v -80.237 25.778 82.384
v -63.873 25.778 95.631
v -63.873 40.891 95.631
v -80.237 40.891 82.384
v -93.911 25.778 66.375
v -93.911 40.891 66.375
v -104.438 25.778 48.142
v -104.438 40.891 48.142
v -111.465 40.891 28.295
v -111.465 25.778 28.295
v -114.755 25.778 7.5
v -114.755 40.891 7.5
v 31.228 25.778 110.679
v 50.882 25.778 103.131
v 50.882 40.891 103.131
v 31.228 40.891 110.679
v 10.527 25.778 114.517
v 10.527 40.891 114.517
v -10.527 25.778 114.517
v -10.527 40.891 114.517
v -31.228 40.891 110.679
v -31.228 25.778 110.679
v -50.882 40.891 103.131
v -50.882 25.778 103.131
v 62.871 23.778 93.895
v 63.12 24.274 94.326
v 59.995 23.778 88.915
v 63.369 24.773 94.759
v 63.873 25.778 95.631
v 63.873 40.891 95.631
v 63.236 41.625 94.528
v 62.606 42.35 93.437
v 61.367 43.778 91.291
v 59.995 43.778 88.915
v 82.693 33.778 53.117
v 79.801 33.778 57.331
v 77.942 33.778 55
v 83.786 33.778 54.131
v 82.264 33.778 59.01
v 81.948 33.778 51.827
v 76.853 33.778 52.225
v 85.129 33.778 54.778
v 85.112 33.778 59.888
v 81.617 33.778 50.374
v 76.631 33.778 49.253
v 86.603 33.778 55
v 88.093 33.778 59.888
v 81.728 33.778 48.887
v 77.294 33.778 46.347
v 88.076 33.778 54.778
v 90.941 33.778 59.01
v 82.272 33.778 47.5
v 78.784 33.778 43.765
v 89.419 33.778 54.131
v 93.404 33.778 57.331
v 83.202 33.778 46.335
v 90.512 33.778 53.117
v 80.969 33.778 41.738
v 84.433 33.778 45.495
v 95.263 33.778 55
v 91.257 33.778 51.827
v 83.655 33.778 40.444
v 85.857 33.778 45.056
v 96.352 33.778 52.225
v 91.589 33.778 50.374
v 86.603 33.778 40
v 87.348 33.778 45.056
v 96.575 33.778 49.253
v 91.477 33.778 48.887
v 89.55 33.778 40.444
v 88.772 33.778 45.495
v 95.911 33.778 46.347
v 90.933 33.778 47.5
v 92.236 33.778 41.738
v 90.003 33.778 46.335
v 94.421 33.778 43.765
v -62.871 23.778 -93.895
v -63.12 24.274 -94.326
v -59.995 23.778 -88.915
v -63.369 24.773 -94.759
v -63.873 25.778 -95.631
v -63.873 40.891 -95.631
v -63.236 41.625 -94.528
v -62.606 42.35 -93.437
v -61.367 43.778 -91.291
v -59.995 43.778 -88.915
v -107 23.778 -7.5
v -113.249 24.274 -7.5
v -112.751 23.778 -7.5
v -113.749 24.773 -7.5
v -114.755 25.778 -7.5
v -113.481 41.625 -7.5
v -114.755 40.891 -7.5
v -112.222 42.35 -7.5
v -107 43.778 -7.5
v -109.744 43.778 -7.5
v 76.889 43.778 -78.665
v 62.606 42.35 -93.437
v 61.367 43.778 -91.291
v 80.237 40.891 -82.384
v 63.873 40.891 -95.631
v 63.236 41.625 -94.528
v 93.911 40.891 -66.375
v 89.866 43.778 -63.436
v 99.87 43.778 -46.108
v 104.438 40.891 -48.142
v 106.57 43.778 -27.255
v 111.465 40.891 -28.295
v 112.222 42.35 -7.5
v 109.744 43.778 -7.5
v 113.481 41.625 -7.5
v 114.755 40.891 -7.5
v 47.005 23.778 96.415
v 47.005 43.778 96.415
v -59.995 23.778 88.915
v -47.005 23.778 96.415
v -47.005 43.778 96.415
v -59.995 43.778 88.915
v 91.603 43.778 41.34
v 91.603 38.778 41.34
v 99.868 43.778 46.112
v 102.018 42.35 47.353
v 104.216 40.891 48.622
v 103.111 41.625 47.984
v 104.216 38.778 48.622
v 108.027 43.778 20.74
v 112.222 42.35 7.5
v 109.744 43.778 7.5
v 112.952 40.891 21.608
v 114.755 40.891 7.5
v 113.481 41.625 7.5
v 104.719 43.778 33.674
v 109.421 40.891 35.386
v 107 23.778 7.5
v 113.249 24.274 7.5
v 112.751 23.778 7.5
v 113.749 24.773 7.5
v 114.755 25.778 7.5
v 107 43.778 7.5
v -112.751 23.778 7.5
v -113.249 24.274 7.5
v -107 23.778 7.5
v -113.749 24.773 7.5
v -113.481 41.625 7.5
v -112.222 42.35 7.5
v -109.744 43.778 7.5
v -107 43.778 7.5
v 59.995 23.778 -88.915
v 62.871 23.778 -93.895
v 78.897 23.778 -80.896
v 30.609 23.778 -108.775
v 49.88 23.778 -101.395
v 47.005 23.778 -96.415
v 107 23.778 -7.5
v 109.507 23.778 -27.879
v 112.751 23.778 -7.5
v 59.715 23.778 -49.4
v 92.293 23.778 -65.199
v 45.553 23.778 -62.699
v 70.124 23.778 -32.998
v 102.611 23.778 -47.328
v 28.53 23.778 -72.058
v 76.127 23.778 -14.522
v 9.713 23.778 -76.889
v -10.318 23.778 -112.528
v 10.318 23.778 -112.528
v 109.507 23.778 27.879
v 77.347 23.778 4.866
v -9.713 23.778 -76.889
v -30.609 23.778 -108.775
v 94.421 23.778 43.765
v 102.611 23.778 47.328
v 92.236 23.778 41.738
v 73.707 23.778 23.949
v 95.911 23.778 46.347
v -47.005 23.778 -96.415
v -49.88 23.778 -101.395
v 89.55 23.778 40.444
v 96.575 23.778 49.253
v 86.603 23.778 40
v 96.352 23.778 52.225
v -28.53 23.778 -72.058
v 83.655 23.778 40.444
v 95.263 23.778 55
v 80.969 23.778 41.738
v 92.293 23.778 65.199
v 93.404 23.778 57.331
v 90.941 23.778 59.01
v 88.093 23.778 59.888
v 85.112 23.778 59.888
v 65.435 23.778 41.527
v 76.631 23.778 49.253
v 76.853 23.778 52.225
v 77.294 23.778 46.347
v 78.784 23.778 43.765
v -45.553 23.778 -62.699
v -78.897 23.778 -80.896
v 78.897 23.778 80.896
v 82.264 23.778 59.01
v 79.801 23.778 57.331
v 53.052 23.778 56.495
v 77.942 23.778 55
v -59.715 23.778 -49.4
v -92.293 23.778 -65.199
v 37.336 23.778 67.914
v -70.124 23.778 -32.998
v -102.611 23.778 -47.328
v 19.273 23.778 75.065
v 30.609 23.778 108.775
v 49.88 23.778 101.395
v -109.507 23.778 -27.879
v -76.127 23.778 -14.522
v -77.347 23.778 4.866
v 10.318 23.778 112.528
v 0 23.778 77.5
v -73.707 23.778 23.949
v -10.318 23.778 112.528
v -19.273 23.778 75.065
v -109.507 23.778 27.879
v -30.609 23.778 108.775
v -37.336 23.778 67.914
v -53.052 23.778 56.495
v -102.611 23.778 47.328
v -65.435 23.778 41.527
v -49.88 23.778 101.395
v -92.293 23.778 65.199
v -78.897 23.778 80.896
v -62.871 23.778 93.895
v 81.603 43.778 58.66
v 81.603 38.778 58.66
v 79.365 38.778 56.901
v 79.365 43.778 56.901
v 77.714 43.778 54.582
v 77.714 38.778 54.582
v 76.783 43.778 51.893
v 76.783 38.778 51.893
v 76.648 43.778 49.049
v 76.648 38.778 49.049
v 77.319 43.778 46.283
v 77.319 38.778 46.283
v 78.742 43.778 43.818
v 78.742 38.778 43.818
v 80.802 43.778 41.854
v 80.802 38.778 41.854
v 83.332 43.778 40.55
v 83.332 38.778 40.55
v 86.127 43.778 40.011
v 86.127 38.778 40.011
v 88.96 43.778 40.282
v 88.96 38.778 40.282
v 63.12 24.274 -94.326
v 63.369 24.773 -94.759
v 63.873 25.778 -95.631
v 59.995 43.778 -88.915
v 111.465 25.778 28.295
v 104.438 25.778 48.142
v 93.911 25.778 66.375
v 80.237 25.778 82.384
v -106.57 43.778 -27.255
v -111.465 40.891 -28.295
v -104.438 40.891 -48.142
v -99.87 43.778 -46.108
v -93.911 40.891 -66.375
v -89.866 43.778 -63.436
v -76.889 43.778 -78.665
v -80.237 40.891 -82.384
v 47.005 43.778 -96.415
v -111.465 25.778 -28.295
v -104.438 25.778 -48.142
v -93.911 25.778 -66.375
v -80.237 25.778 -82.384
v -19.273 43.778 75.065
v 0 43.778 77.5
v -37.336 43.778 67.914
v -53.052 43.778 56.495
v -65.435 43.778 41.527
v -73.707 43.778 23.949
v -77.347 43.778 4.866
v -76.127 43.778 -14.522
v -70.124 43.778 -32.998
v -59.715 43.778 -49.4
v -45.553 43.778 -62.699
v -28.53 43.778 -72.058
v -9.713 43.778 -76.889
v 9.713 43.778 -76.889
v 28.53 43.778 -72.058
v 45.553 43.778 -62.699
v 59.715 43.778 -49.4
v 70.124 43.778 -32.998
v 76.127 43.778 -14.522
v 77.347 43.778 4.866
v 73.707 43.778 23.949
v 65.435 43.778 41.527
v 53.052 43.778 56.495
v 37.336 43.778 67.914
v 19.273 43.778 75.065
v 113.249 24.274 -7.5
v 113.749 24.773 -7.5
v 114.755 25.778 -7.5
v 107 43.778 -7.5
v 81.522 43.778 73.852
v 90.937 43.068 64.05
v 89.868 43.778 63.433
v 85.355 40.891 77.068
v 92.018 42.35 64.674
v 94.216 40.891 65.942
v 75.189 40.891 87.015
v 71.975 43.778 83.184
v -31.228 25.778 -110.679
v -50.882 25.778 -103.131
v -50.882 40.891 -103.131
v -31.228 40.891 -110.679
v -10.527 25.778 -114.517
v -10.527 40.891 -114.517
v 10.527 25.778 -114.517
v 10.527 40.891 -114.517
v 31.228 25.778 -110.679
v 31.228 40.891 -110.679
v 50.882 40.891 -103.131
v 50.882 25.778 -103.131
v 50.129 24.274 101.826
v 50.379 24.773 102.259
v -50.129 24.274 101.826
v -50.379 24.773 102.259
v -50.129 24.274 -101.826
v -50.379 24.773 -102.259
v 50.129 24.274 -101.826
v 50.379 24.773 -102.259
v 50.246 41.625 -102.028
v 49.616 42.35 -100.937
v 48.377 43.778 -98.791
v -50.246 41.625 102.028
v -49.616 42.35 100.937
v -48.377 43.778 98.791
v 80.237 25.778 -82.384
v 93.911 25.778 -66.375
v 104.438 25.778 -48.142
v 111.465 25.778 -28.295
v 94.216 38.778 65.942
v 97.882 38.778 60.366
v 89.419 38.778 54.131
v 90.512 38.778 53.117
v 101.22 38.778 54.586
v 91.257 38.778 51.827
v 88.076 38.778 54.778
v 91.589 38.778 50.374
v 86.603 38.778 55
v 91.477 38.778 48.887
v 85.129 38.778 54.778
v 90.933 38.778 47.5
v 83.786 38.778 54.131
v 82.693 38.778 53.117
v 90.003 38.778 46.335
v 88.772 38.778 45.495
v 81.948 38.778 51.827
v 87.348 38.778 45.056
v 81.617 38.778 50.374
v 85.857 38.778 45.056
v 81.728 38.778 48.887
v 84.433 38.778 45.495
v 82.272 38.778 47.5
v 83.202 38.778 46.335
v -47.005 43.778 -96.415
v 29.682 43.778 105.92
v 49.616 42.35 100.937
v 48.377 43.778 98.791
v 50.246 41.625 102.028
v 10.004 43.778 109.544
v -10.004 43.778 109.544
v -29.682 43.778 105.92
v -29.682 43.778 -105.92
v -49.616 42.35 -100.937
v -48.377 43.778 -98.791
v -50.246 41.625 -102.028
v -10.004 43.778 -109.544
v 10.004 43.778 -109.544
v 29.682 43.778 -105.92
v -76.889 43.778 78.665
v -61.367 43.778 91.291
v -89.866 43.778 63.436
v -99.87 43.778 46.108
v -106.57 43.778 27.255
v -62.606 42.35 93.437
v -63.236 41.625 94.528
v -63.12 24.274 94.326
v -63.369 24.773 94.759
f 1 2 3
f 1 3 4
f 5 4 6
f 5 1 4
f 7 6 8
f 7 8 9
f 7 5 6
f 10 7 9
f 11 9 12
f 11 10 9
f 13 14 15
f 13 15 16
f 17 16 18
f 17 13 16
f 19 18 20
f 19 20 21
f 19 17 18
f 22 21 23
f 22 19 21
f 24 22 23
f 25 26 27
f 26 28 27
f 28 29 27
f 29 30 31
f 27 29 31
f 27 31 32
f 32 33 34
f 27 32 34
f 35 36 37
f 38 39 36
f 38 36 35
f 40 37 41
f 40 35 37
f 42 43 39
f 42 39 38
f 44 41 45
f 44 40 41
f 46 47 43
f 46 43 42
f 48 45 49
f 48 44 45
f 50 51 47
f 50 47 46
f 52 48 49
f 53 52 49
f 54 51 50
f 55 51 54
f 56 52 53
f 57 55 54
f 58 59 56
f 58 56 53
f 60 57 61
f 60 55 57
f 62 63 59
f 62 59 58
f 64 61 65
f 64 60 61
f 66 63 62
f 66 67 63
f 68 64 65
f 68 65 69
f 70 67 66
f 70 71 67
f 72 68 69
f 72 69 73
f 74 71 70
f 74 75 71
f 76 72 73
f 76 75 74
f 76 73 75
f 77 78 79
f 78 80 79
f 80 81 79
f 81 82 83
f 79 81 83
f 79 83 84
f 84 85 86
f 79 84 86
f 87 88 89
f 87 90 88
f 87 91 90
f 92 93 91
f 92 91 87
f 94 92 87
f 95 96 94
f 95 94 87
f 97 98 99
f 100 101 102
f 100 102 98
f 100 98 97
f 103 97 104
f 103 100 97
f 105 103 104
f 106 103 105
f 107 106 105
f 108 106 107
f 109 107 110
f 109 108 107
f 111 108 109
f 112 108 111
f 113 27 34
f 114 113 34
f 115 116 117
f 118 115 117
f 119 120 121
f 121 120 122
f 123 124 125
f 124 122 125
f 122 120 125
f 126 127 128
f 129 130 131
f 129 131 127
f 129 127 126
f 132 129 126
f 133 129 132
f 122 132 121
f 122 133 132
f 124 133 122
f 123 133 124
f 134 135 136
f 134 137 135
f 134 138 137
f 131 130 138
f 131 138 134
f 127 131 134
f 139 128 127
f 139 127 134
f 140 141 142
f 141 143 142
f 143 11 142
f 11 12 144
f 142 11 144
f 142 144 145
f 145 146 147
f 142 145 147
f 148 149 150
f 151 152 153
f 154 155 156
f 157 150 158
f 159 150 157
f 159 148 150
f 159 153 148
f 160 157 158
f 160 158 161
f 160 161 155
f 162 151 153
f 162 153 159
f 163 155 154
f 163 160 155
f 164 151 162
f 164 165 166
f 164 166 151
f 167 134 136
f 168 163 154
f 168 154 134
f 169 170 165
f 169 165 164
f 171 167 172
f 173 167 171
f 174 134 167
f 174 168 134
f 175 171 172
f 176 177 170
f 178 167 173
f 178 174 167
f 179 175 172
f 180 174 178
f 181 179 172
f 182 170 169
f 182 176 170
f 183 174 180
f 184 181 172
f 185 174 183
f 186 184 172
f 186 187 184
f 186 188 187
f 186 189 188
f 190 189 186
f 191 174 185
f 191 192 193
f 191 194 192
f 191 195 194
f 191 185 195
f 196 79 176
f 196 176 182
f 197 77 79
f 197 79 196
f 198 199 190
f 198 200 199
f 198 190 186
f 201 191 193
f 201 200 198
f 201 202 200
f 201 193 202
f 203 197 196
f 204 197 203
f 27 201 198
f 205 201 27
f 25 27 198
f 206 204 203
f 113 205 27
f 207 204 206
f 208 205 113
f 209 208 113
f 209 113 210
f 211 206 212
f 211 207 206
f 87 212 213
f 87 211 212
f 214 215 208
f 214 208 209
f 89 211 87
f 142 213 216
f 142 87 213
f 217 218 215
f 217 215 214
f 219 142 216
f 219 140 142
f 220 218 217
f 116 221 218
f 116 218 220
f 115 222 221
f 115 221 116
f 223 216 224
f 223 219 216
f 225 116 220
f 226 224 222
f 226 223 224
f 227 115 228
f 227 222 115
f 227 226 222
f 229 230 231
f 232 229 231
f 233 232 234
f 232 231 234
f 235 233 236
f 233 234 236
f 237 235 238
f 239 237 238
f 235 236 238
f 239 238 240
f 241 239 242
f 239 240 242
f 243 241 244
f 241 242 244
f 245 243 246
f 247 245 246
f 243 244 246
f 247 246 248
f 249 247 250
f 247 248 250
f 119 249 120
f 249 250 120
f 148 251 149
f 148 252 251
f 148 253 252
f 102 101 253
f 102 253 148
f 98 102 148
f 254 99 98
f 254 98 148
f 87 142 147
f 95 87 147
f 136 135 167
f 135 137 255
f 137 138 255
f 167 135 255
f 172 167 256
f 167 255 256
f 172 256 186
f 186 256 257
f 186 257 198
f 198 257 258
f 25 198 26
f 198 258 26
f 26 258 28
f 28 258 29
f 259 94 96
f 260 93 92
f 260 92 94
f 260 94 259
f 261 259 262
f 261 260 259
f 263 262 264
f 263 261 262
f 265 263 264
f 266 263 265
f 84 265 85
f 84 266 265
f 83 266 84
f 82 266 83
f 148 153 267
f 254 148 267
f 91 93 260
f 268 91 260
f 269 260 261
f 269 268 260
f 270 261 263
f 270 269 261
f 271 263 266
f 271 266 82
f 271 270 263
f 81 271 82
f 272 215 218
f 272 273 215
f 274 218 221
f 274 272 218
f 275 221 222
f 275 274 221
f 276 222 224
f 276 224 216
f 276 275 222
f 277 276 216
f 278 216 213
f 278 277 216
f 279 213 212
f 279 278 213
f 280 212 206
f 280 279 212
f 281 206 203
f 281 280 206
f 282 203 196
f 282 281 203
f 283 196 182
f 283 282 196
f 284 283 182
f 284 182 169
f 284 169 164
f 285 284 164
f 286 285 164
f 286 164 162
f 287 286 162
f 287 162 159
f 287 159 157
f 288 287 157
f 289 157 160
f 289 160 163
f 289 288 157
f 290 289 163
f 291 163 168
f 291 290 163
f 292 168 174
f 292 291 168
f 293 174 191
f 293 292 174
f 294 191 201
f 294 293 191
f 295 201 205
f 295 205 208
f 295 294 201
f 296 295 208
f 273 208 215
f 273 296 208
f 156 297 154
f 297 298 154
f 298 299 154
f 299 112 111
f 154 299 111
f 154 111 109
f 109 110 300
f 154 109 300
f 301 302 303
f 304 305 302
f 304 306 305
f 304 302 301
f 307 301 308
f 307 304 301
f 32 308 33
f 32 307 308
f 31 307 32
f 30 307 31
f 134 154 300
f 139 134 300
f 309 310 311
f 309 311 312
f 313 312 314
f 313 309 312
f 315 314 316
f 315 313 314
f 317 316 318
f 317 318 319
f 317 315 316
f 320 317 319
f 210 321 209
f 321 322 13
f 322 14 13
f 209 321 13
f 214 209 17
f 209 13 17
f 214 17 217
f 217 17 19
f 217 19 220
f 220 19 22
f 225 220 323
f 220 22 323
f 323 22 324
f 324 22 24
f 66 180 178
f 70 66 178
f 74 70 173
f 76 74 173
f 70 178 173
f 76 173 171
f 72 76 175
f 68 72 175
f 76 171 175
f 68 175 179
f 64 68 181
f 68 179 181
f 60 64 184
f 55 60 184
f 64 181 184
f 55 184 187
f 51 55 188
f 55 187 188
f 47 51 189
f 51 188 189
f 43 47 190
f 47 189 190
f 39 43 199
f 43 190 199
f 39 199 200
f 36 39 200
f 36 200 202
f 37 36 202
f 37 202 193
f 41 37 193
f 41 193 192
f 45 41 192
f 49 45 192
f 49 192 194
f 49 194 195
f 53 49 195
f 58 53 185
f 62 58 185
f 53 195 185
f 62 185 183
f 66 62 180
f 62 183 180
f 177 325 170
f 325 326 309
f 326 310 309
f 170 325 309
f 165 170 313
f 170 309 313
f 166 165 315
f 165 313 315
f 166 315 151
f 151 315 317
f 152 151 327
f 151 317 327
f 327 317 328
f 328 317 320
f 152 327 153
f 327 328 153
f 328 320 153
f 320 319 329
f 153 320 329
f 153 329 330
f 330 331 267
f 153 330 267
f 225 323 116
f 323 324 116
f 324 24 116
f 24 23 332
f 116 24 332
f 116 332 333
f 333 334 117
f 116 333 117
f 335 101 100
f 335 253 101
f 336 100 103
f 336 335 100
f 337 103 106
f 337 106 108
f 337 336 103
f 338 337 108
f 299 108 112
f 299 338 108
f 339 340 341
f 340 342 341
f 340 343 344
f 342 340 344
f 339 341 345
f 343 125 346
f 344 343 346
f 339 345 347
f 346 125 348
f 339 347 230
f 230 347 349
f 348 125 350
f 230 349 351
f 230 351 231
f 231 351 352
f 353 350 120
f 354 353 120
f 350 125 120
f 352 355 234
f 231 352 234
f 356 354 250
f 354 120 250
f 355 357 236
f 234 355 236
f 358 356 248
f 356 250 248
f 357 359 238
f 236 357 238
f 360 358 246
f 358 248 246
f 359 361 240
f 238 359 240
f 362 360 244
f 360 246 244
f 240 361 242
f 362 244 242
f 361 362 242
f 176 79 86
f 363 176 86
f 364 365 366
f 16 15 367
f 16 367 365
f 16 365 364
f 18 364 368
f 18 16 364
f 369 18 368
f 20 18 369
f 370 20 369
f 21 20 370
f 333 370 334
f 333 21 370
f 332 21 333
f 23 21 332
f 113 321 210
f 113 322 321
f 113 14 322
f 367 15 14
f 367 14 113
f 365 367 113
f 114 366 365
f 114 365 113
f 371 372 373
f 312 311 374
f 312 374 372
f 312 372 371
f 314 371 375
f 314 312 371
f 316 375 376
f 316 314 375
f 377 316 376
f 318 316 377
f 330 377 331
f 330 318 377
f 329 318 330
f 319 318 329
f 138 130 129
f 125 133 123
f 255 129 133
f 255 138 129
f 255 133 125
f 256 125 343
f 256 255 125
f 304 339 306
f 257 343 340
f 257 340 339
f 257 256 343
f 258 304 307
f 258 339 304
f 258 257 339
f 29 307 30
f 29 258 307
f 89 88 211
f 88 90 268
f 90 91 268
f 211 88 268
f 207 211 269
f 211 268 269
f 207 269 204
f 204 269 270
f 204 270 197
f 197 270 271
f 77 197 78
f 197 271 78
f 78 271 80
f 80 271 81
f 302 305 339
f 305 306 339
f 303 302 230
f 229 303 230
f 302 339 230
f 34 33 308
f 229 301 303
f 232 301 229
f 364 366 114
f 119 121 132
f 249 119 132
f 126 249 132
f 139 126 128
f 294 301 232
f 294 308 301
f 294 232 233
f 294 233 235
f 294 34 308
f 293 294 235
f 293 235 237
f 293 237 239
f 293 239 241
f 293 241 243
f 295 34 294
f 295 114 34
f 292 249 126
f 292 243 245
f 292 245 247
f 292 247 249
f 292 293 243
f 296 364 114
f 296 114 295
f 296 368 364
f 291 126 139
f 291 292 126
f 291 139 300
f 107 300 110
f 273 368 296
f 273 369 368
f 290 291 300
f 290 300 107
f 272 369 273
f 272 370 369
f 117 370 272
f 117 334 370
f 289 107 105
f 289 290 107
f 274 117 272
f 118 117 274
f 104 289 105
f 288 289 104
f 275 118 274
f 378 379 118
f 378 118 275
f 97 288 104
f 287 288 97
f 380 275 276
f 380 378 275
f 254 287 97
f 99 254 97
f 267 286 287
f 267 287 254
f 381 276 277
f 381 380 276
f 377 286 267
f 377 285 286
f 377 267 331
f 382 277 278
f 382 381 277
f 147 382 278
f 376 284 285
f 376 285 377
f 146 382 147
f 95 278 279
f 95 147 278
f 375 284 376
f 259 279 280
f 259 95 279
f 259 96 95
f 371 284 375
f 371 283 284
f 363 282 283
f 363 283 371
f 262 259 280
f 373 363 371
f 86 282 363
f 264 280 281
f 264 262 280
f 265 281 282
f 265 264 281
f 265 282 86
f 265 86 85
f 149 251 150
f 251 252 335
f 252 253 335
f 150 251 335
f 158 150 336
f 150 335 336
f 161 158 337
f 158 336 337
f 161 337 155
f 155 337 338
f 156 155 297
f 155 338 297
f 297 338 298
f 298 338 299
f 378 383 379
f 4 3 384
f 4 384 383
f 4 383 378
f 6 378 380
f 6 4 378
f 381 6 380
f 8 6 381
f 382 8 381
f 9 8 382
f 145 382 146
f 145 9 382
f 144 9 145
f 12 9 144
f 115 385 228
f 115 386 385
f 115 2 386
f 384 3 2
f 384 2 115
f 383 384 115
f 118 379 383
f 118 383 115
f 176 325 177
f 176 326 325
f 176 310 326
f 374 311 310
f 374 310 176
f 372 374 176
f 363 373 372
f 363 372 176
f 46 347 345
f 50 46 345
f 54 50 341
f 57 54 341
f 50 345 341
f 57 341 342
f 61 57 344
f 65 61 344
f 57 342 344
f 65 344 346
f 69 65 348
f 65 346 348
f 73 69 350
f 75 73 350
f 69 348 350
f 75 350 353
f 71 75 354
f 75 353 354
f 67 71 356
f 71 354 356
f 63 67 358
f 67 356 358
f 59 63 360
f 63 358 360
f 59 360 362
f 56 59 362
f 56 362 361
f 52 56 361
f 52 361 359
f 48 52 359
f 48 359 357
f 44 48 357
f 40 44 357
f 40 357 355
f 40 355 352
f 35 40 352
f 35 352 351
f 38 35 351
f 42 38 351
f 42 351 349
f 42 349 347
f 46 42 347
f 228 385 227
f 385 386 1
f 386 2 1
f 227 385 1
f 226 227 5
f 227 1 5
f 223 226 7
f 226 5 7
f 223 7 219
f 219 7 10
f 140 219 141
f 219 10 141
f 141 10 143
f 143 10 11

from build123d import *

# Parameters (mm, degrees)
SKETCH_3_R               = 5
CUT_EXTRUDE_1_DEPTH      = 164.859696082
SKETCH_4_R               = 10
CUT_EXTRUDE_2_DEPTH      = 10
CUT_EXTRUDE_START        = -5
CUT_EXTRUDE_3_DEPTH      = 5
CHAMFER_2_SIZE           = 2
SKETCH_7_W               = 8
SKETCH_7_H               = 20
CUT_EXTRUDE_7_DEPTH      = 7.5
PATTERN_CIRCULAR_1_COUNT = 6


with BuildPart() as part:
    # Эскиз1 → Повернуть1 (revolve)
    with BuildSketch(Plane.XY, mode=Mode.PRIVATE) as revolve_1_sk:
        Polygon((115, 23.777702661), (77.5, 23.777702661), (77.5, 43.777702661), (110, 43.777702661), (115, 40.890951315), align=None)
    revolve(revolve_1_sk.sketch.rotate(Axis((0, 147.550331696, 0), (0, -1, 0)), 90), axis=Axis((0, 147.550331696, 0), (0, -1, 0)))

    # Эскиз3 → Вырез-Вытянуть1 (cut, through all)
    with BuildSketch(Plane(origin=(0, 43.777702661, 0), x_dir=(1, 0, 0), z_dir=(0, 1, 0))):
        with Locations(Location((86.602540378, -50, 0), (0, 0, 270))):
            Circle(SKETCH_3_R)
    extrude(amount=-CUT_EXTRUDE_1_DEPTH, mode=Mode.SUBTRACT)

    # Эскиз4 → Вырез-Вытянуть2 (cut)
    with BuildSketch(Plane.XZ.offset(-23.777702661)):
        with Locations(Location((86.602540378, 50, 0), (0, 0, 270))):
            Circle(SKETCH_4_R)
    extrude(amount=-CUT_EXTRUDE_2_DEPTH, mode=Mode.SUBTRACT)

    # Эскиз5 → Вырез-Вытянуть3 (cut)
    with BuildSketch(Plane(origin=(0, 43.777702661, 0), x_dir=(1, 0, 0), z_dir=(0, 1, 0)).offset(CUT_EXTRUDE_START)):
        with BuildLine():
            Line((91.602540378, -41.339745962), (136.199116664, -67.087591285))
            Line((136.199116664, -67.087591285), (126.755895542, -84.729555796))
            Line((126.755895542, -84.729555796), (81.602540378, -58.660254038))
            ThreePointArc((81.602540378, -58.660254038), (77.942286341, -45), (91.602540378, -41.339745962))
        make_face()
    extrude(amount=CUT_EXTRUDE_3_DEPTH, mode=Mode.SUBTRACT)

    # Фаска2
    chamfer_2_edges = [part.edges().sort_by_distance(p)[0] for p in [
        (0, 23.777702661, -115),
    ]]
    chamfer(chamfer_2_edges, length=CHAMFER_2_SIZE)

    # Эскиз7 → Вырез-Вытянуть7 (cut, symmetric)
    with BuildSketch(Plane.XY):
        with Locations((-111, 33.777702661)):
            Rectangle(SKETCH_7_W, SKETCH_7_H)
    cut_extrude_7 = extrude(amount=CUT_EXTRUDE_7_DEPTH, both=True, mode=Mode.SUBTRACT)

    # Круговой массив1: Вырез-Вытянуть7 ×6 about axis
    pattern_circular_1_axis = Axis((0, 0, 0), (0, 1, 0))
    for i in range(1, PATTERN_CIRCULAR_1_COUNT):
        add(cut_extrude_7.rotate(pattern_circular_1_axis, i * 360 / PATTERN_CIRCULAR_1_COUNT), mode=Mode.SUBTRACT)


solid = part.part
